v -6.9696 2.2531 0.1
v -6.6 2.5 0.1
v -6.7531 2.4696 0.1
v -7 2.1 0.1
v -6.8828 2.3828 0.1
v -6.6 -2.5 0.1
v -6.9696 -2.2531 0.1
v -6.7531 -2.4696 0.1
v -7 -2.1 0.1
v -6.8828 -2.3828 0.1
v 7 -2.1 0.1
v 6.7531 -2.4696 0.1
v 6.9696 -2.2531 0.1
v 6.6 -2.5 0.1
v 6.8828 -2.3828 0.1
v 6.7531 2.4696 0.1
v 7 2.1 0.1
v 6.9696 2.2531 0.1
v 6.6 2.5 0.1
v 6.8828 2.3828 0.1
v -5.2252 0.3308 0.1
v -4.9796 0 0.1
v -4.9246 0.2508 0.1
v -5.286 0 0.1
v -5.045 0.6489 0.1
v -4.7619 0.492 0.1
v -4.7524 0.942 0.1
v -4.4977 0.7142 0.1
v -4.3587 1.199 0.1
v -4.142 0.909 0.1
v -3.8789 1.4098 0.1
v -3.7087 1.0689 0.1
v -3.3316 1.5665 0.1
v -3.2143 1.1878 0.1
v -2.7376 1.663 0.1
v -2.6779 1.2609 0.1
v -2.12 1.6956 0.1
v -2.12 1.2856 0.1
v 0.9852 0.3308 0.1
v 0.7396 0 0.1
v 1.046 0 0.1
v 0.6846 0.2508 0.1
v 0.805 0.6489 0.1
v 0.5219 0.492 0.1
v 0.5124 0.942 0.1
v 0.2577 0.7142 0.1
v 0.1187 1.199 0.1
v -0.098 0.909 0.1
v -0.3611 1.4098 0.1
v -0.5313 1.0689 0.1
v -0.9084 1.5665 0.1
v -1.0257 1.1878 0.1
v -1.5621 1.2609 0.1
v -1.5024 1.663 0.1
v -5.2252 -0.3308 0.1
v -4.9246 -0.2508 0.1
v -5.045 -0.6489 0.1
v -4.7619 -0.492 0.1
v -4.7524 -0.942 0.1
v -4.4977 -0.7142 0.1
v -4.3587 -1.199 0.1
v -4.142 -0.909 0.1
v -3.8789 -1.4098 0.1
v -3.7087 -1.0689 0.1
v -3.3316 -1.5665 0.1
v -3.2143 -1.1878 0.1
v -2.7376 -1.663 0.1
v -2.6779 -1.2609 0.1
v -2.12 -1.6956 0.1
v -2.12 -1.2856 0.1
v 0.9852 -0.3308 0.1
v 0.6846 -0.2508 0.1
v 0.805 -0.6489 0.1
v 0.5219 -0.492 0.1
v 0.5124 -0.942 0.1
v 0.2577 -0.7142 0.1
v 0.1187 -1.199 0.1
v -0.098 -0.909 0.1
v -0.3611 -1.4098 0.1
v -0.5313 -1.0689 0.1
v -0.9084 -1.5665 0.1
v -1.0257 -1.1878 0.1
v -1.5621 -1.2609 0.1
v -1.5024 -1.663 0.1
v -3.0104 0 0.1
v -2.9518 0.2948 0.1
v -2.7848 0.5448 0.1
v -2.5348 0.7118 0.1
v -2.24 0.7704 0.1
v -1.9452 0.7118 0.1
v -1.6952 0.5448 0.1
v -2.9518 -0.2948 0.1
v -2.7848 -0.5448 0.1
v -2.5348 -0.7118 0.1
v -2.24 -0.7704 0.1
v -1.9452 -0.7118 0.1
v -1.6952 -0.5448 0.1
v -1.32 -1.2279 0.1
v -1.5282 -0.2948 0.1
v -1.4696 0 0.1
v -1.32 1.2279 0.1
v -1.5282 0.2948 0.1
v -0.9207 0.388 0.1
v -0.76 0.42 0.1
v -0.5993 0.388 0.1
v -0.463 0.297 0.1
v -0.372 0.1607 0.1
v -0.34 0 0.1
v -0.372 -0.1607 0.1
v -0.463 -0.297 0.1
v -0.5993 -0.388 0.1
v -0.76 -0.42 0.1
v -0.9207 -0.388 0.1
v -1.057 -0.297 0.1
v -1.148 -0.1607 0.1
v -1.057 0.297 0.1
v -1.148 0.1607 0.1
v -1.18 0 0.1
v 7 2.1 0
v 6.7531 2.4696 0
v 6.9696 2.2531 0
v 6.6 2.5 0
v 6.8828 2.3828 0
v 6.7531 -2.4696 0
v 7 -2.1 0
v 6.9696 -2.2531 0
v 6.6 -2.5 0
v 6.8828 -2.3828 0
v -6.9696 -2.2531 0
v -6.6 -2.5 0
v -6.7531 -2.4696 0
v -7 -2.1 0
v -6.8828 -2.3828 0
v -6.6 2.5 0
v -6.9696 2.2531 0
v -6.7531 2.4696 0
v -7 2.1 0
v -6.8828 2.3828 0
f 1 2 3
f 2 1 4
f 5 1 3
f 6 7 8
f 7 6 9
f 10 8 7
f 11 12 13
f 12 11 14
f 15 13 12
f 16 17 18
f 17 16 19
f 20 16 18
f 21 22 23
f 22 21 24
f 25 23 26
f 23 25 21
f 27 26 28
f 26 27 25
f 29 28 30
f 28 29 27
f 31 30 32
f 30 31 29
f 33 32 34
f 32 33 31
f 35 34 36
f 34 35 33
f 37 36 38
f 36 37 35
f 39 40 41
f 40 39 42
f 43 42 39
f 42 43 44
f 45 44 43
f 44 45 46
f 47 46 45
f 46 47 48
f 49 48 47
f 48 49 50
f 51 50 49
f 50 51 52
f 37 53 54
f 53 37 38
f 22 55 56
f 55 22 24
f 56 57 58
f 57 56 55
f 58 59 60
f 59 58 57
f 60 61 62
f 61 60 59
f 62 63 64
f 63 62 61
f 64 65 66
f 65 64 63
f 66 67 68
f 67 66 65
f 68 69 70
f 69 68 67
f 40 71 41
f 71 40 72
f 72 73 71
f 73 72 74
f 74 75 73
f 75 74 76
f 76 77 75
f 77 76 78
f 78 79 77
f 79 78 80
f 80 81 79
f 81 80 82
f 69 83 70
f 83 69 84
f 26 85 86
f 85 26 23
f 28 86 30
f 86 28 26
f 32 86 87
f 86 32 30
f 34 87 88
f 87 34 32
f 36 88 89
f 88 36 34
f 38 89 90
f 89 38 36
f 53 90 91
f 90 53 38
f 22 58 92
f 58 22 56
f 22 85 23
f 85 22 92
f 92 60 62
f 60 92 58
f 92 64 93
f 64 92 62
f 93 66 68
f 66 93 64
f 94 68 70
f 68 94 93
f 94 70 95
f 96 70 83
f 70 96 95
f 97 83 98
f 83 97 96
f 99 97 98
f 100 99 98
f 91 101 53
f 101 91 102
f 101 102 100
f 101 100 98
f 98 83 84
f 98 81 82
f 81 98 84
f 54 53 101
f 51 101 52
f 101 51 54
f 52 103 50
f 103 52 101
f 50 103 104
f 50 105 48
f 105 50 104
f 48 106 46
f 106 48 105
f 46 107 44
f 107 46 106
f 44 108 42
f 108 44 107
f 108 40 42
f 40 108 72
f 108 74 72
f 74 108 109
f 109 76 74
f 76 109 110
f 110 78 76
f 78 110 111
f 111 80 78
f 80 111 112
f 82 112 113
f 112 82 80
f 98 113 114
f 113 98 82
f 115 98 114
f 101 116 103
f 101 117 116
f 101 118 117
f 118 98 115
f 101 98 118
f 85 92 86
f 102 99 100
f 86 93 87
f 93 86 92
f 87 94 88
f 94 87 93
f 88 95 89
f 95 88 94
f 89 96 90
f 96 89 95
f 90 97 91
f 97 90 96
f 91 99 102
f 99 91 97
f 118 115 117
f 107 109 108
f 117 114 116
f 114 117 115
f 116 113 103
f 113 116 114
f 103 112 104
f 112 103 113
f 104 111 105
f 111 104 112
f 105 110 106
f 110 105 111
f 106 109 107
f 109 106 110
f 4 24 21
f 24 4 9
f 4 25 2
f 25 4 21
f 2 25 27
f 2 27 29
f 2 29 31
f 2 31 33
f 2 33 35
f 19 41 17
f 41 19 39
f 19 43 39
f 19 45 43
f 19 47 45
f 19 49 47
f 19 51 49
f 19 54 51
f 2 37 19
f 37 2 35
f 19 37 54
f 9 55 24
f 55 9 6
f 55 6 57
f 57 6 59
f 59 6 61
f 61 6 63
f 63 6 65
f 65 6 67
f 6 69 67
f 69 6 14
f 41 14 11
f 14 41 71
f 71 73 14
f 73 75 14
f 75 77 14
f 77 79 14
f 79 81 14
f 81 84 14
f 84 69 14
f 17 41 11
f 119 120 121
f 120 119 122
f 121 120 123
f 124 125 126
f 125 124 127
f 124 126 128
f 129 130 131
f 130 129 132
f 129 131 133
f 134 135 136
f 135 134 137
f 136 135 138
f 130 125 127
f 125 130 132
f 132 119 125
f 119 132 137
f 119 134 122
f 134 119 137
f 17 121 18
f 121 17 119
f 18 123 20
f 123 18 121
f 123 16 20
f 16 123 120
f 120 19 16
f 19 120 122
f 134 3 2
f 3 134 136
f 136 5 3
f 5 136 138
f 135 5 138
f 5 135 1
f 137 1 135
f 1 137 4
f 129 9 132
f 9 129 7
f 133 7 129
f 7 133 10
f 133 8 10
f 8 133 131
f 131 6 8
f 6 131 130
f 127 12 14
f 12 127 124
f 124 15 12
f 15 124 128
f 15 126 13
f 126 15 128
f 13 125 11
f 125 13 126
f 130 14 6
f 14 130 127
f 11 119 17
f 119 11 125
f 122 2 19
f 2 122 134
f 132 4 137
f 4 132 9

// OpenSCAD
// file: ../p/1-4cyli.scad
use <../lib.scad>
function ldraw_lib__1_4cyli() = [
// 0 Cylinder 0.25
// 0 Name: 1-4cyli.dat
// 0 Author: James Jessiman
// 0 !LDRAW_ORG Primitive UPDATE 2012-01
// 0 !LICENSE Licensed under CC BY 4.0 : see CAreadme.txt
// 
// 0 BFC CERTIFY CCW
  [0,"BFC","CERTIFY"],
  [0,"BFC","CCW"],
// 
// 0 !HISTORY 2002-03-23 [sbliss] Added BFC statement.
// 0 !HISTORY 2002-04-25 [PTadmin] Official Update 2002-02
// 0 !HISTORY 2007-06-22 [PTadmin] Header formatted for Contributor Agreement
// 0 !HISTORY 2008-07-01 [PTadmin] Official Update 2008-01
// 0 !HISTORY 2012-02-16 [Philo] Changed to CCW
// 0 !HISTORY 2012-03-30 [PTadmin] Official Update 2012-01
// 
// 
// 4 16 1 1 0 0.9239 1 0.3827 0.9239 0 0.3827 1 0 0
  [4,16,1,1,0,0.9239,1,0.3827,0.9239,0,0.3827,1,0,0],
// 5 24 1 0 0 1 1 0 0.9239 0 0.3827 1 0 -1
  [5,24,1,0,0,1,1,0,0.9239,0,0.3827,1,0,-1],
// 4 16 0.9239 1 0.3827 0.7071 1 0.7071 0.7071 0 0.7071 0.9239 0 0.3827
  [4,16,0.9239,1,0.3827,0.7071,1,0.7071,0.7071,0,0.7071,0.9239,0,0.3827],
// 5 24 0.9239 0 0.3827 0.9239 1 0.3827 0.7071 0 0.7071 1 0 0
  [5,24,0.9239,0,0.3827,0.9239,1,0.3827,0.7071,0,0.7071,1,0,0],
// 4 16 0.7071 1 0.7071 0.3827 1 0.9239 0.3827 0 0.9239 0.7071 0 0.7071
  [4,16,0.7071,1,0.7071,0.3827,1,0.9239,0.3827,0,0.9239,0.7071,0,0.7071],
// 5 24 0.7071 0 0.7071 0.7071 1 0.7071 0.3827 0 0.9239 0.9239 0 0.3827
  [5,24,0.7071,0,0.7071,0.7071,1,0.7071,0.3827,0,0.9239,0.9239,0,0.3827],
// 4 16 0.3827 1 0.9239 0 1 1 0 0 1 0.3827 0 0.9239
  [4,16,0.3827,1,0.9239,0,1,1,0,0,1,0.3827,0,0.9239],
// 5 24 0.3827 0 0.9239 0.3827 1 0.9239 0 0 1 0.7071 0 0.7071
  [5,24,0.3827,0,0.9239,0.3827,1,0.9239,0,0,1,0.7071,0,0.7071],
// 5 24 0 0 1 0 1 1 0.3827 0 0.9239 -1 0 1
  [5,24,0,0,1,0,1,1,0.3827,0,0.9239,-1,0,1],
];
module ldraw_lib__1_4cyli(step=0, col=false, unit=2/5, alt=false, line=0.2, solid=!$preview)
    makepoly(ldraw_lib__1_4cyli(), step=step, col=col, unit=unit, alt=alt, line=line, solid=solid);
ldraw_lib__1_4cyli(line=0.2);
// file: ../p/1-4chrd.scad
use <../lib.scad>
function ldraw_lib__1_4chrd() = [
// 0 Chord 0.25
// 0 Name: 1-4chrd.dat
// 0 Author: Max Martin Richter [MMR1988]
// 0 !LDRAW_ORG Primitive UPDATE 2023-05
// 0 !LICENSE Licensed under CC BY 4.0 : see CAreadme.txt
// 
// 0 BFC CERTIFY CCW
  [0,"BFC","CERTIFY"],
  [0,"BFC","CCW"],
// 
// 0 !HISTORY 2004-04-22 [PTadmin] Official Update 2004-02
// 0 !HISTORY 2007-10-09 [PTadmin] Header formatted for Contributor Agreement
// 0 !HISTORY 2008-07-01 [PTadmin] Official Update 2008-01
// 0 !HISTORY 2012-08-02 [MMR1988] Re-creation with PrimGen2 and Rectifier
// 0 !HISTORY 2012-08-09 [PTadmin] Official Update 2012-02
// 0 !HISTORY 2023-10-27 [OrionP] Change author to MMR1988 from hafhead
// 0 !HISTORY 2023-10-31 [OrionP] Official Update 2023-05
// 
// 4 16 0.9239 0 0.3827 0.3827 0 0.9239 0 0 1 1 0 0
  [4,16,0.9239,0,0.3827,0.3827,0,0.9239,0,0,1,1,0,0],
// 3 16 0.7071 0 0.7071 0.3827 0 0.9239 0.9239 0 0.3827
  [3,16,0.7071,0,0.7071,0.3827,0,0.9239,0.9239,0,0.3827],
];
module ldraw_lib__1_4chrd(step=0, col=false, unit=2/5, alt=false, line=0.2, solid=!$preview)
    makepoly(ldraw_lib__1_4chrd(), step=step, col=col, unit=unit, alt=alt, line=line, solid=solid);
ldraw_lib__1_4chrd(line=0.2);
// main file
use <../lib.scad>
use <../p/1-4chrd.scad>
use <../p/1-4cyli.scad>
function ldraw_lib__6178096g() = [
// 0 Sticker  0.6 x  1.7 with Tail Light
// 0 Name: 6178096g.dat
// 0 Author: Evert-Jan Boer [ejboer]
// 0 !LDRAW_ORG Part UPDATE 2024-02
// 0 !LICENSE Licensed under CC BY 4.0 : see CAreadme.txt
// 
// 0 BFC CERTIFY CCW
  [0,"BFC","CERTIFY"],
  [0,"BFC","CCW"],
// 
// 0 !KEYWORDS Mini VW Beetle, Set 40252, Volkswagen
// 
// 0 !HISTORY 2024-03-24 [OrionP] Official Update 2024-02
// 
// 1 16 -16.5 -.25 5.25 0 0 -1 0 1 0 1 0 0 1-4chrd.dat
  [1,16,-16.5,-.25,5.25,0,0,-1,0,1,0,1,0,0, ldraw_lib__1_4chrd()],
// 1 16 -16.5 -.25 -5.25 -1 0 0 0 1 0 0 0 -1 1-4chrd.dat
  [1,16,-16.5,-.25,-5.25,-1,0,0,0,1,0,0,0,-1, ldraw_lib__1_4chrd()],
// 1 16 16.5 -.25 -5.25 0 0 1 0 1 0 -1 0 0 1-4chrd.dat
  [1,16,16.5,-.25,-5.25,0,0,1,0,1,0,-1,0,0, ldraw_lib__1_4chrd()],
// 1 16 16.5 -.25 5.25 1 0 0 0 1 0 0 0 1 1-4chrd.dat
  [1,16,16.5,-.25,5.25,1,0,0,0,1,0,0,0,1, ldraw_lib__1_4chrd()],
// 4 0 -13.215 -.25 0 -12.449 -.25 0 -12.3116 -.25 .627 -13.0629 -.25 .827
  [4,0,-13.215,-.25,0,-12.449,-.25,0,-12.3116,-.25,.627,-13.0629,-.25,.827],
// 4 0 -13.0629 -.25 .827 -12.3116 -.25 .627 -11.9048 -.25 1.2299 -12.6125 -.25 1.6222
  [4,0,-13.0629,-.25,.827,-12.3116,-.25,.627,-11.9048,-.25,1.2299,-12.6125,-.25,1.6222],
// 4 0 -12.6125 -.25 1.6222 -11.9048 -.25 1.2299 -11.2442 -.25 1.7856 -11.8811 -.25 2.3551
  [4,0,-12.6125,-.25,1.6222,-11.9048,-.25,1.2299,-11.2442,-.25,1.7856,-11.8811,-.25,2.3551],
// 4 0 -11.8811 -.25 2.3551 -11.2442 -.25 1.7856 -10.3551 -.25 2.2726 -10.8968 -.25 2.9974
  [4,0,-11.8811,-.25,2.3551,-11.2442,-.25,1.7856,-10.3551,-.25,2.2726,-10.8968,-.25,2.9974],
// 4 0 -10.8968 -.25 2.9974 -10.3551 -.25 2.2726 -9.2718 -.25 2.6723 -9.6973 -.25 3.5246
  [4,0,-10.8968,-.25,2.9974,-10.3551,-.25,2.2726,-9.2718,-.25,2.6723,-9.6973,-.25,3.5246],
// 4 0 -9.6973 -.25 3.5246 -9.2718 -.25 2.6723 -8.0358 -.25 2.9694 -8.3289 -.25 3.9163
  [4,0,-9.6973,-.25,3.5246,-9.2718,-.25,2.6723,-8.0358,-.25,2.9694,-8.3289,-.25,3.9163],
// 4 0 -8.3289 -.25 3.9163 -8.0358 -.25 2.9694 -6.6947 -.25 3.1522 -6.8441 -.25 4.1576
  [4,0,-8.3289,-.25,3.9163,-8.0358,-.25,2.9694,-6.6947,-.25,3.1522,-6.8441,-.25,4.1576],
// 4 0 -6.6947 -.25 3.1522 -5.3 -.25 3.214 -5.3 -.25 4.239 -6.8441 -.25 4.1576
  [4,0,-6.6947,-.25,3.1522,-5.3,-.25,3.214,-5.3,-.25,4.239,-6.8441,-.25,4.1576],
// 4 0 2.615 -.25 0 2.4629 -.25 .827 1.7116 -.25 .627 1.849 -.25 0
  [4,0,2.615,-.25,0,2.4629,-.25,.827,1.7116,-.25,.627,1.849,-.25,0],
// 4 0 2.4629 -.25 .827 2.0125 -.25 1.6222 1.3048 -.25 1.2299 1.7116 -.25 .627
  [4,0,2.4629,-.25,.827,2.0125,-.25,1.6222,1.3048,-.25,1.2299,1.7116,-.25,.627],
// 4 0 2.0125 -.25 1.6222 1.2811 -.25 2.3551 .6442 -.25 1.7856 1.3048 -.25 1.2299
  [4,0,2.0125,-.25,1.6222,1.2811,-.25,2.3551,.6442,-.25,1.7856,1.3048,-.25,1.2299],
// 4 0 1.2811 -.25 2.3551 .2968 -.25 2.9974 -.2449 -.25 2.2726 .6442 -.25 1.7856
  [4,0,1.2811,-.25,2.3551,.2968,-.25,2.9974,-.2449,-.25,2.2726,.6442,-.25,1.7856],
// 4 0 .2968 -.25 2.9974 -.9027 -.25 3.5246 -1.3282 -.25 2.6723 -.2449 -.25 2.2726
  [4,0,.2968,-.25,2.9974,-.9027,-.25,3.5246,-1.3282,-.25,2.6723,-.2449,-.25,2.2726],
// 4 0 -.9027 -.25 3.5246 -2.2711 -.25 3.9163 -2.5642 -.25 2.9694 -1.3282 -.25 2.6723
  [4,0,-.9027,-.25,3.5246,-2.2711,-.25,3.9163,-2.5642,-.25,2.9694,-1.3282,-.25,2.6723],
// 4 0 -5.3 -.25 4.239 -5.3 -.25 3.214 -3.9053 -.25 3.1522 -3.7559 -.25 4.1576
  [4,0,-5.3,-.25,4.239,-5.3,-.25,3.214,-3.9053,-.25,3.1522,-3.7559,-.25,4.1576],
// 4 0 -13.215 -.25 0 -13.0629 -.25 -.827 -12.3116 -.25 -.627 -12.449 -.25 0
  [4,0,-13.215,-.25,0,-13.0629,-.25,-.827,-12.3116,-.25,-.627,-12.449,-.25,0],
// 4 0 -11.9048 -.25 -1.2299 -12.3116 -.25 -.627 -13.0629 -.25 -.827 -12.6125 -.25 -1.6222
  [4,0,-11.9048,-.25,-1.2299,-12.3116,-.25,-.627,-13.0629,-.25,-.827,-12.6125,-.25,-1.6222],
// 4 0 -11.2442 -.25 -1.7856 -11.9048 -.25 -1.2299 -12.6125 -.25 -1.6222 -11.8811 -.25 -2.3551
  [4,0,-11.2442,-.25,-1.7856,-11.9048,-.25,-1.2299,-12.6125,-.25,-1.6222,-11.8811,-.25,-2.3551],
// 4 0 -10.3551 -.25 -2.2726 -11.2442 -.25 -1.7856 -11.8811 -.25 -2.3551 -10.8968 -.25 -2.9974
  [4,0,-10.3551,-.25,-2.2726,-11.2442,-.25,-1.7856,-11.8811,-.25,-2.3551,-10.8968,-.25,-2.9974],
// 4 0 -9.2718 -.25 -2.6723 -10.3551 -.25 -2.2726 -10.8968 -.25 -2.9974 -9.6973 -.25 -3.5246
  [4,0,-9.2718,-.25,-2.6723,-10.3551,-.25,-2.2726,-10.8968,-.25,-2.9974,-9.6973,-.25,-3.5246],
// 4 0 -8.0358 -.25 -2.9694 -9.2718 -.25 -2.6723 -9.6973 -.25 -3.5246 -8.3289 -.25 -3.9163
  [4,0,-8.0358,-.25,-2.9694,-9.2718,-.25,-2.6723,-9.6973,-.25,-3.5246,-8.3289,-.25,-3.9163],
// 4 0 -6.6947 -.25 -3.1522 -8.0358 -.25 -2.9694 -8.3289 -.25 -3.9163 -6.8441 -.25 -4.1576
  [4,0,-6.6947,-.25,-3.1522,-8.0358,-.25,-2.9694,-8.3289,-.25,-3.9163,-6.8441,-.25,-4.1576],
// 4 0 -6.6947 -.25 -3.1522 -6.8441 -.25 -4.1576 -5.3 -.25 -4.239 -5.3 -.25 -3.214
  [4,0,-6.6947,-.25,-3.1522,-6.8441,-.25,-4.1576,-5.3,-.25,-4.239,-5.3,-.25,-3.214],
// 4 0 2.615 -.25 0 1.849 -.25 0 1.7116 -.25 -.627 2.4629 -.25 -.827
  [4,0,2.615,-.25,0,1.849,-.25,0,1.7116,-.25,-.627,2.4629,-.25,-.827],
// 4 0 1.3048 -.25 -1.2299 2.0125 -.25 -1.6222 2.4629 -.25 -.827 1.7116 -.25 -.627
  [4,0,1.3048,-.25,-1.2299,2.0125,-.25,-1.6222,2.4629,-.25,-.827,1.7116,-.25,-.627],
// 4 0 .6442 -.25 -1.7856 1.2811 -.25 -2.3551 2.0125 -.25 -1.6222 1.3048 -.25 -1.2299
  [4,0,.6442,-.25,-1.7856,1.2811,-.25,-2.3551,2.0125,-.25,-1.6222,1.3048,-.25,-1.2299],
// 4 0 -.2449 -.25 -2.2726 .2968 -.25 -2.9974 1.2811 -.25 -2.3551 .6442 -.25 -1.7856
  [4,0,-.2449,-.25,-2.2726,.2968,-.25,-2.9974,1.2811,-.25,-2.3551,.6442,-.25,-1.7856],
// 4 0 -1.3282 -.25 -2.6723 -.9027 -.25 -3.5246 .2968 -.25 -2.9974 -.2449 -.25 -2.2726
  [4,0,-1.3282,-.25,-2.6723,-.9027,-.25,-3.5246,.2968,-.25,-2.9974,-.2449,-.25,-2.2726],
// 4 0 -2.5642 -.25 -2.9694 -2.2711 -.25 -3.9163 -.9027 -.25 -3.5246 -1.3282 -.25 -2.6723
  [4,0,-2.5642,-.25,-2.9694,-2.2711,-.25,-3.9163,-.9027,-.25,-3.5246,-1.3282,-.25,-2.6723],
// 4 0 -5.3 -.25 -4.239 -3.7559 -.25 -4.1576 -3.9053 -.25 -3.1522 -5.3 -.25 -3.214
  [4,0,-5.3,-.25,-4.239,-3.7559,-.25,-4.1576,-3.9053,-.25,-3.1522,-5.3,-.25,-3.214],
// 4 4 -11.9048 -.25 1.2299 -12.3116 -.25 .627 -7.526 -.25 0 -7.3794 -.25 .7371
  [4,4,-11.9048,-.25,1.2299,-12.3116,-.25,.627,-7.526,-.25,0,-7.3794,-.25,.7371],
// 4 4 -11.9048 -.25 1.2299 -7.3794 -.25 .7371 -10.3551 -.25 2.2726 -11.2442 -.25 1.7856
  [4,4,-11.9048,-.25,1.2299,-7.3794,-.25,.7371,-10.3551,-.25,2.2726,-11.2442,-.25,1.7856],
// 4 4 -6.9619 -.25 1.3619 -9.2718 -.25 2.6723 -10.3551 -.25 2.2726 -7.3794 -.25 .7371
  [4,4,-6.9619,-.25,1.3619,-9.2718,-.25,2.6723,-10.3551,-.25,2.2726,-7.3794,-.25,.7371],
// 4 4 -6.3371 -.25 1.7794 -8.0358 -.25 2.9694 -9.2718 -.25 2.6723 -6.9619 -.25 1.3619
  [4,4,-6.3371,-.25,1.7794,-8.0358,-.25,2.9694,-9.2718,-.25,2.6723,-6.9619,-.25,1.3619],
// 4 4 -5.6 -.25 1.926 -6.6947 -.25 3.1522 -8.0358 -.25 2.9694 -6.3371 -.25 1.7794
  [4,4,-5.6,-.25,1.926,-6.6947,-.25,3.1522,-8.0358,-.25,2.9694,-6.3371,-.25,1.7794],
// 4 4 -4.863 -.25 1.7794 -5.3 -.25 3.214 -6.6947 -.25 3.1522 -5.6 -.25 1.926
  [4,4,-4.863,-.25,1.7794,-5.3,-.25,3.214,-6.6947,-.25,3.1522,-5.6,-.25,1.926],
// 4 4 -5.3 -.25 3.214 -4.863 -.25 1.7794 -4.2381 -.25 1.3619 -3.9053 -.25 3.1522
  [4,4,-5.3,-.25,3.214,-4.863,-.25,1.7794,-4.2381,-.25,1.3619,-3.9053,-.25,3.1522],
// 4 4 -11.9048 -.25 -1.2299 -7.3794 -.25 -.7371 -12.449 -.25 0 -12.3116 -.25 -.627
  [4,4,-11.9048,-.25,-1.2299,-7.3794,-.25,-.7371,-12.449,-.25,0,-12.3116,-.25,-.627],
// 4 4 -12.3116 -.25 .627 -12.449 -.25 0 -7.3794 -.25 -.7371 -7.526 -.25 0
  [4,4,-12.3116,-.25,.627,-12.449,-.25,0,-7.3794,-.25,-.7371,-7.526,-.25,0],
// 4 4 -11.9048 -.25 -1.2299 -11.2442 -.25 -1.7856 -10.3551 -.25 -2.2726 -7.3794 -.25 -.7371
  [4,4,-11.9048,-.25,-1.2299,-11.2442,-.25,-1.7856,-10.3551,-.25,-2.2726,-7.3794,-.25,-.7371],
// 4 4 -10.3551 -.25 -2.2726 -9.2718 -.25 -2.6723 -6.9619 -.25 -1.3619 -7.3794 -.25 -.7371
  [4,4,-10.3551,-.25,-2.2726,-9.2718,-.25,-2.6723,-6.9619,-.25,-1.3619,-7.3794,-.25,-.7371],
// 4 4 -9.2718 -.25 -2.6723 -8.0358 -.25 -2.9694 -6.6947 -.25 -3.1522 -6.9619 -.25 -1.3619
  [4,4,-9.2718,-.25,-2.6723,-8.0358,-.25,-2.9694,-6.6947,-.25,-3.1522,-6.9619,-.25,-1.3619],
// 4 4 -5.3 -.25 -3.214 -6.3371 -.25 -1.7794 -6.9619 -.25 -1.3619 -6.6947 -.25 -3.1522
  [4,4,-5.3,-.25,-3.214,-6.3371,-.25,-1.7794,-6.9619,-.25,-1.3619,-6.6947,-.25,-3.1522],
// 3 4 -6.3371 -.25 -1.7794 -5.3 -.25 -3.214 -5.6 -.25 -1.926
  [3,4,-6.3371,-.25,-1.7794,-5.3,-.25,-3.214,-5.6,-.25,-1.926],
// 4 4 -3.9053 -.25 -3.1522 -4.863 -.25 -1.7794 -5.6 -.25 -1.926 -5.3 -.25 -3.214
  [4,4,-3.9053,-.25,-3.1522,-4.863,-.25,-1.7794,-5.6,-.25,-1.926,-5.3,-.25,-3.214],
// 4 4 -3.3 -.25 -3.0697 -4.2381 -.25 -1.3619 -4.863 -.25 -1.7794 -3.9053 -.25 -3.1522
  [4,4,-3.3,-.25,-3.0697,-4.2381,-.25,-1.3619,-4.863,-.25,-1.7794,-3.9053,-.25,-3.1522],
// 3 4 -3.8206 -.25 -.7371 -4.2381 -.25 -1.3619 -3.3 -.25 -3.0697
  [3,4,-3.8206,-.25,-.7371,-4.2381,-.25,-1.3619,-3.3,-.25,-3.0697],
// 3 4 -3.674 -.25 0 -3.8206 -.25 -.7371 -3.3 -.25 -3.0697
  [3,4,-3.674,-.25,0,-3.8206,-.25,-.7371,-3.3,-.25,-3.0697],
// 4 4 -4.2381 -.25 1.3619 -3.8206 -.25 .7371 -3.3 -.25 3.0697 -3.9053 -.25 3.1522
  [4,4,-4.2381,-.25,1.3619,-3.8206,-.25,.7371,-3.3,-.25,3.0697,-3.9053,-.25,3.1522],
// 3 4 -3.3 -.25 3.0697 -3.8206 -.25 .7371 -3.674 -.25 0
  [3,4,-3.3,-.25,3.0697,-3.8206,-.25,.7371,-3.674,-.25,0],
// 3 4 -3.3 -.25 3.0697 -3.674 -.25 0 -3.3 -.25 -3.0697
  [3,4,-3.3,-.25,3.0697,-3.674,-.25,0,-3.3,-.25,-3.0697],
// 3 0 -3.3 -.25 -3.0697 -3.9053 -.25 -3.1522 -3.7559 -.25 -4.1576
  [3,0,-3.3,-.25,-3.0697,-3.9053,-.25,-3.1522,-3.7559,-.25,-4.1576],
// 4 0 -2.2711 -.25 -3.9163 -2.5642 -.25 -2.9694 -3.3 -.25 -3.0697 -3.7559 -.25 -4.1576
  [4,0,-2.2711,-.25,-3.9163,-2.5642,-.25,-2.9694,-3.3,-.25,-3.0697,-3.7559,-.25,-4.1576],
// 3 0 -3.7559 -.25 4.1576 -3.9053 -.25 3.1522 -3.3 -.25 3.0697
  [3,0,-3.7559,-.25,4.1576,-3.9053,-.25,3.1522,-3.3,-.25,3.0697],
// 4 0 -2.2711 -.25 3.9163 -3.7559 -.25 4.1576 -3.3 -.25 3.0697 -2.5642 -.25 2.9694
  [4,0,-2.2711,-.25,3.9163,-3.7559,-.25,4.1576,-3.3,-.25,3.0697,-2.5642,-.25,2.9694],
// 4 57 -3.3 -.25 3.0697 -2.3018 -.25 .9701 -1.3282 -.25 2.6723 -2.5642 -.25 2.9694
  [4,57,-3.3,-.25,3.0697,-2.3018,-.25,.9701,-1.3282,-.25,2.6723,-2.5642,-.25,2.9694],
// 3 57 -1.3282 -.25 2.6723 -2.3018 -.25 .9701 -1.9 -.25 1.05
  [3,57,-1.3282,-.25,2.6723,-2.3018,-.25,.9701,-1.9,-.25,1.05],
// 4 57 -1.9 -.25 1.05 -1.4982 -.25 .9701 -.2449 -.25 2.2726 -1.3282 -.25 2.6723
  [4,57,-1.9,-.25,1.05,-1.4982,-.25,.9701,-.2449,-.25,2.2726,-1.3282,-.25,2.6723],
// 4 57 -1.4982 -.25 .9701 -1.1575 -.25 .7425 .6442 -.25 1.7856 -.2449 -.25 2.2726
  [4,57,-1.4982,-.25,.9701,-1.1575,-.25,.7425,.6442,-.25,1.7856,-.2449,-.25,2.2726],
// 4 57 -1.1575 -.25 .7425 -.9299 -.25 .4018 1.3048 -.25 1.2299 .6442 -.25 1.7856
  [4,57,-1.1575,-.25,.7425,-.9299,-.25,.4018,1.3048,-.25,1.2299,.6442,-.25,1.7856],
// 4 57 -.9299 -.25 .4018 -.85 -.25 0 1.7116 -.25 .627 1.3048 -.25 1.2299
  [4,57,-.9299,-.25,.4018,-.85,-.25,0,1.7116,-.25,.627,1.3048,-.25,1.2299],
// 4 57 1.7116 -.25 -.627 1.849 -.25 0 1.7116 -.25 .627 -.85 -.25 0
  [4,57,1.7116,-.25,-.627,1.849,-.25,0,1.7116,-.25,.627,-.85,-.25,0],
// 4 57 1.7116 -.25 -.627 -.85 -.25 0 -.9299 -.25 -.4018 1.3048 -.25 -1.2299
  [4,57,1.7116,-.25,-.627,-.85,-.25,0,-.9299,-.25,-.4018,1.3048,-.25,-1.2299],
// 4 57 1.3048 -.25 -1.2299 -.9299 -.25 -.4018 -1.1575 -.25 -.7425 .6442 -.25 -1.7856
  [4,57,1.3048,-.25,-1.2299,-.9299,-.25,-.4018,-1.1575,-.25,-.7425,.6442,-.25,-1.7856],
// 4 57 .6442 -.25 -1.7856 -1.1575 -.25 -.7425 -1.4982 -.25 -.9701 -.2449 -.25 -2.2726
  [4,57,.6442,-.25,-1.7856,-1.1575,-.25,-.7425,-1.4982,-.25,-.9701,-.2449,-.25,-2.2726],
// 4 57 -.2449 -.25 -2.2726 -1.4982 -.25 -.9701 -1.9 -.25 -1.05 -1.3282 -.25 -2.6723
  [4,57,-.2449,-.25,-2.2726,-1.4982,-.25,-.9701,-1.9,-.25,-1.05,-1.3282,-.25,-2.6723],
// 4 57 -1.3282 -.25 -2.6723 -1.9 -.25 -1.05 -2.3018 -.25 -.9701 -2.5642 -.25 -2.9694
  [4,57,-1.3282,-.25,-2.6723,-1.9,-.25,-1.05,-2.3018,-.25,-.9701,-2.5642,-.25,-2.9694],
// 4 57 -2.5642 -.25 -2.9694 -2.3018 -.25 -.9701 -2.6425 -.25 -.7425 -3.3 -.25 -3.0697
  [4,57,-2.5642,-.25,-2.9694,-2.3018,-.25,-.9701,-2.6425,-.25,-.7425,-3.3,-.25,-3.0697],
// 3 57 -2.8701 -.25 -.4018 -3.3 -.25 -3.0697 -2.6425 -.25 -.7425
  [3,57,-2.8701,-.25,-.4018,-3.3,-.25,-3.0697,-2.6425,-.25,-.7425],
// 3 57 -3.3 -.25 3.0697 -2.6425 -.25 .7425 -2.3018 -.25 .9701
  [3,57,-3.3,-.25,3.0697,-2.6425,-.25,.7425,-2.3018,-.25,.9701],
// 3 57 -3.3 -.25 3.0697 -2.8701 -.25 .4018 -2.6425 -.25 .7425
  [3,57,-3.3,-.25,3.0697,-2.8701,-.25,.4018,-2.6425,-.25,.7425],
// 3 57 -3.3 -.25 3.0697 -2.95 -.25 0 -2.8701 -.25 .4018
  [3,57,-3.3,-.25,3.0697,-2.95,-.25,0,-2.8701,-.25,.4018],
// 3 57 -2.95 -.25 0 -3.3 -.25 -3.0697 -2.8701 -.25 -.4018
  [3,57,-2.95,-.25,0,-3.3,-.25,-3.0697,-2.8701,-.25,-.4018],
// 3 57 -3.3 -.25 3.0697 -3.3 -.25 -3.0697 -2.95 -.25 0
  [3,57,-3.3,-.25,3.0697,-3.3,-.25,-3.0697,-2.95,-.25,0],
// 3 14 -7.526 -.25 0 -7.3794 -.25 -.7371 -7.3794 -.25 .7371
  [3,14,-7.526,-.25,0,-7.3794,-.25,-.7371,-7.3794,-.25,.7371],
// 3 14 -3.8206 -.25 .7371 -3.8206 -.25 -.7371 -3.674 -.25 0
  [3,14,-3.8206,-.25,.7371,-3.8206,-.25,-.7371,-3.674,-.25,0],
// 4 14 -7.3794 -.25 .7371 -7.3794 -.25 -.7371 -6.9619 -.25 -1.3619 -6.9619 -.25 1.3619
  [4,14,-7.3794,-.25,.7371,-7.3794,-.25,-.7371,-6.9619,-.25,-1.3619,-6.9619,-.25,1.3619],
// 4 14 -6.9619 -.25 1.3619 -6.9619 -.25 -1.3619 -6.3371 -.25 -1.7794 -6.3371 -.25 1.7794
  [4,14,-6.9619,-.25,1.3619,-6.9619,-.25,-1.3619,-6.3371,-.25,-1.7794,-6.3371,-.25,1.7794],
// 4 14 -6.3371 -.25 1.7794 -6.3371 -.25 -1.7794 -5.6 -.25 -1.926 -5.6 -.25 1.926
  [4,14,-6.3371,-.25,1.7794,-6.3371,-.25,-1.7794,-5.6,-.25,-1.926,-5.6,-.25,1.926],
// 4 14 -5.6 -.25 1.926 -5.6 -.25 -1.926 -4.863 -.25 -1.7794 -4.863 -.25 1.7794
  [4,14,-5.6,-.25,1.926,-5.6,-.25,-1.926,-4.863,-.25,-1.7794,-4.863,-.25,1.7794],
// 4 14 -4.863 -.25 1.7794 -4.863 -.25 -1.7794 -4.2381 -.25 -1.3619 -4.2381 -.25 1.3619
  [4,14,-4.863,-.25,1.7794,-4.863,-.25,-1.7794,-4.2381,-.25,-1.3619,-4.2381,-.25,1.3619],
// 4 14 -4.2381 -.25 1.3619 -4.2381 -.25 -1.3619 -3.8206 -.25 -.7371 -3.8206 -.25 .7371
  [4,14,-4.2381,-.25,1.3619,-4.2381,-.25,-1.3619,-3.8206,-.25,-.7371,-3.8206,-.25,.7371],
// 3 14 -2.95 -.25 0 -2.8701 -.25 -.4018 -2.8701 -.25 .4018
  [3,14,-2.95,-.25,0,-2.8701,-.25,-.4018,-2.8701,-.25,.4018],
// 3 14 -.9299 -.25 .4018 -.9299 -.25 -.4018 -.85 -.25 0
  [3,14,-.9299,-.25,.4018,-.9299,-.25,-.4018,-.85,-.25,0],
// 4 14 -2.8701 -.25 .4018 -2.8701 -.25 -.4018 -2.6425 -.25 -.7425 -2.6425 -.25 .7425
  [4,14,-2.8701,-.25,.4018,-2.8701,-.25,-.4018,-2.6425,-.25,-.7425,-2.6425,-.25,.7425],
// 4 14 -2.6425 -.25 .7425 -2.6425 -.25 -.7425 -2.3018 -.25 -.9701 -2.3018 -.25 .9701
  [4,14,-2.6425,-.25,.7425,-2.6425,-.25,-.7425,-2.3018,-.25,-.9701,-2.3018,-.25,.9701],
// 4 14 -2.3018 -.25 .9701 -2.3018 -.25 -.9701 -1.9 -.25 -1.05 -1.9 -.25 1.05
  [4,14,-2.3018,-.25,.9701,-2.3018,-.25,-.9701,-1.9,-.25,-1.05,-1.9,-.25,1.05],
// 4 14 -1.9 -.25 1.05 -1.9 -.25 -1.05 -1.4982 -.25 -.9701 -1.4982 -.25 .9701
  [4,14,-1.9,-.25,1.05,-1.9,-.25,-1.05,-1.4982,-.25,-.9701,-1.4982,-.25,.9701],
// 4 14 -1.4982 -.25 .9701 -1.4982 -.25 -.9701 -1.1575 -.25 -.7425 -1.1575 -.25 .7425
  [4,14,-1.4982,-.25,.9701,-1.4982,-.25,-.9701,-1.1575,-.25,-.7425,-1.1575,-.25,.7425],
// 4 14 -1.1575 -.25 .7425 -1.1575 -.25 -.7425 -.9299 -.25 -.4018 -.9299 -.25 .4018
  [4,14,-1.1575,-.25,.7425,-1.1575,-.25,-.7425,-.9299,-.25,-.4018,-.9299,-.25,.4018],
// 4 16 -17.5 -.25 -5.25 -13.215 -.25 0 -13.0629 -.25 .827 -17.5 -.25 5.25
  [4,16,-17.5,-.25,-5.25,-13.215,-.25,0,-13.0629,-.25,.827,-17.5,-.25,5.25],
// 4 16 -12.6125 -.25 1.6222 -16.5 -.25 6.25 -17.5 -.25 5.25 -13.0629 -.25 .827
  [4,16,-12.6125,-.25,1.6222,-16.5,-.25,6.25,-17.5,-.25,5.25,-13.0629,-.25,.827],
// 3 16 -16.5 -.25 6.25 -12.6125 -.25 1.6222 -11.8811 -.25 2.3551
  [3,16,-16.5,-.25,6.25,-12.6125,-.25,1.6222,-11.8811,-.25,2.3551],
// 3 16 -16.5 -.25 6.25 -11.8811 -.25 2.3551 -10.8968 -.25 2.9974
  [3,16,-16.5,-.25,6.25,-11.8811,-.25,2.3551,-10.8968,-.25,2.9974],
// 3 16 -16.5 -.25 6.25 -10.8968 -.25 2.9974 -9.6973 -.25 3.5246
  [3,16,-16.5,-.25,6.25,-10.8968,-.25,2.9974,-9.6973,-.25,3.5246],
// 3 16 -16.5 -.25 6.25 -9.6973 -.25 3.5246 -8.3289 -.25 3.9163
  [3,16,-16.5,-.25,6.25,-9.6973,-.25,3.5246,-8.3289,-.25,3.9163],
// 3 16 -16.5 -.25 6.25 -8.3289 -.25 3.9163 -6.8441 -.25 4.1576
  [3,16,-16.5,-.25,6.25,-8.3289,-.25,3.9163,-6.8441,-.25,4.1576],
// 4 16 17.5 -.25 5.25 16.5 -.25 6.25 2.4629 -.25 .827 2.615 -.25 0
  [4,16,17.5,-.25,5.25,16.5,-.25,6.25,2.4629,-.25,.827,2.615,-.25,0],
// 3 16 16.5 -.25 6.25 2.0125 -.25 1.6222 2.4629 -.25 .827
  [3,16,16.5,-.25,6.25,2.0125,-.25,1.6222,2.4629,-.25,.827],
// 3 16 16.5 -.25 6.25 1.2811 -.25 2.3551 2.0125 -.25 1.6222
  [3,16,16.5,-.25,6.25,1.2811,-.25,2.3551,2.0125,-.25,1.6222],
// 3 16 16.5 -.25 6.25 .2968 -.25 2.9974 1.2811 -.25 2.3551
  [3,16,16.5,-.25,6.25,.2968,-.25,2.9974,1.2811,-.25,2.3551],
// 3 16 16.5 -.25 6.25 -.9027 -.25 3.5246 .2968 -.25 2.9974
  [3,16,16.5,-.25,6.25,-.9027,-.25,3.5246,.2968,-.25,2.9974],
// 3 16 16.5 -.25 6.25 -2.2711 -.25 3.9163 -.9027 -.25 3.5246
  [3,16,16.5,-.25,6.25,-2.2711,-.25,3.9163,-.9027,-.25,3.5246],
// 3 16 16.5 -.25 6.25 -3.7559 -.25 4.1576 -2.2711 -.25 3.9163
  [3,16,16.5,-.25,6.25,-3.7559,-.25,4.1576,-2.2711,-.25,3.9163],
// 4 16 -6.8441 -.25 4.1576 -5.3 -.25 4.239 16.5 -.25 6.25 -16.5 -.25 6.25
  [4,16,-6.8441,-.25,4.1576,-5.3,-.25,4.239,16.5,-.25,6.25,-16.5,-.25,6.25],
// 3 16 16.5 -.25 6.25 -5.3 -.25 4.239 -3.7559 -.25 4.1576
  [3,16,16.5,-.25,6.25,-5.3,-.25,4.239,-3.7559,-.25,4.1576],
// 4 16 -13.215 -.25 0 -17.5 -.25 -5.25 -16.5 -.25 -6.25 -13.0629 -.25 -.827
  [4,16,-13.215,-.25,0,-17.5,-.25,-5.25,-16.5,-.25,-6.25,-13.0629,-.25,-.827],
// 3 16 -13.0629 -.25 -.827 -16.5 -.25 -6.25 -12.6125 -.25 -1.6222
  [3,16,-13.0629,-.25,-.827,-16.5,-.25,-6.25,-12.6125,-.25,-1.6222],
// 3 16 -12.6125 -.25 -1.6222 -16.5 -.25 -6.25 -11.8811 -.25 -2.3551
  [3,16,-12.6125,-.25,-1.6222,-16.5,-.25,-6.25,-11.8811,-.25,-2.3551],
// 3 16 -11.8811 -.25 -2.3551 -16.5 -.25 -6.25 -10.8968 -.25 -2.9974
  [3,16,-11.8811,-.25,-2.3551,-16.5,-.25,-6.25,-10.8968,-.25,-2.9974],
// 3 16 -10.8968 -.25 -2.9974 -16.5 -.25 -6.25 -9.6973 -.25 -3.5246
  [3,16,-10.8968,-.25,-2.9974,-16.5,-.25,-6.25,-9.6973,-.25,-3.5246],
// 3 16 -9.6973 -.25 -3.5246 -16.5 -.25 -6.25 -8.3289 -.25 -3.9163
  [3,16,-9.6973,-.25,-3.5246,-16.5,-.25,-6.25,-8.3289,-.25,-3.9163],
// 3 16 -8.3289 -.25 -3.9163 -16.5 -.25 -6.25 -6.8441 -.25 -4.1576
  [3,16,-8.3289,-.25,-3.9163,-16.5,-.25,-6.25,-6.8441,-.25,-4.1576],
// 4 16 16.5 -.25 -6.25 -5.3 -.25 -4.239 -6.8441 -.25 -4.1576 -16.5 -.25 -6.25
  [4,16,16.5,-.25,-6.25,-5.3,-.25,-4.239,-6.8441,-.25,-4.1576,-16.5,-.25,-6.25],
// 4 16 17.5 -.25 -5.25 2.615 -.25 0 2.4629 -.25 -.827 16.5 -.25 -6.25
  [4,16,17.5,-.25,-5.25,2.615,-.25,0,2.4629,-.25,-.827,16.5,-.25,-6.25],
// 3 16 2.4629 -.25 -.827 2.0125 -.25 -1.6222 16.5 -.25 -6.25
  [3,16,2.4629,-.25,-.827,2.0125,-.25,-1.6222,16.5,-.25,-6.25],
// 3 16 2.0125 -.25 -1.6222 1.2811 -.25 -2.3551 16.5 -.25 -6.25
  [3,16,2.0125,-.25,-1.6222,1.2811,-.25,-2.3551,16.5,-.25,-6.25],
// 3 16 1.2811 -.25 -2.3551 .2968 -.25 -2.9974 16.5 -.25 -6.25
  [3,16,1.2811,-.25,-2.3551,.2968,-.25,-2.9974,16.5,-.25,-6.25],
// 3 16 .2968 -.25 -2.9974 -.9027 -.25 -3.5246 16.5 -.25 -6.25
  [3,16,.2968,-.25,-2.9974,-.9027,-.25,-3.5246,16.5,-.25,-6.25],
// 3 16 -.9027 -.25 -3.5246 -2.2711 -.25 -3.9163 16.5 -.25 -6.25
  [3,16,-.9027,-.25,-3.5246,-2.2711,-.25,-3.9163,16.5,-.25,-6.25],
// 3 16 -2.2711 -.25 -3.9163 -3.7559 -.25 -4.1576 16.5 -.25 -6.25
  [3,16,-2.2711,-.25,-3.9163,-3.7559,-.25,-4.1576,16.5,-.25,-6.25],
// 3 16 -3.7559 -.25 -4.1576 -5.3 -.25 -4.239 16.5 -.25 -6.25
  [3,16,-3.7559,-.25,-4.1576,-5.3,-.25,-4.239,16.5,-.25,-6.25],
// 3 16 17.5 -.25 5.25 2.615 -.25 0 17.5 -.25 -5.25
  [3,16,17.5,-.25,5.25,2.615,-.25,0,17.5,-.25,-5.25],
// 
// 1 16 16.5 0 5.25 1 0 0 0 -1 0 0 0 1 1-4chrd.dat
  [1,16,16.5,0,5.25,1,0,0,0,-1,0,0,0,1, ldraw_lib__1_4chrd()],
// 1 16 16.5 0 -5.25 0 0 1 0 -1 0 -1 0 0 1-4chrd.dat
  [1,16,16.5,0,-5.25,0,0,1,0,-1,0,-1,0,0, ldraw_lib__1_4chrd()],
// 1 16 -16.5 0 -5.25 -1 0 0 0 -1 0 0 0 -1 1-4chrd.dat
  [1,16,-16.5,0,-5.25,-1,0,0,0,-1,0,0,0,-1, ldraw_lib__1_4chrd()],
// 1 16 -16.5 0 5.25 0 0 -1 0 -1 0 1 0 0 1-4chrd.dat
  [1,16,-16.5,0,5.25,0,0,-1,0,-1,0,1,0,0, ldraw_lib__1_4chrd()],
// 4 16 16.5 0 -6.25 -16.5 0 -6.25 -17.5 0 -5.25 17.5 0 -5.25
  [4,16,16.5,0,-6.25,-16.5,0,-6.25,-17.5,0,-5.25,17.5,0,-5.25],
// 4 16 17.5 0 5.25 17.5 0 -5.25 -17.5 0 -5.25 -17.5 0 5.25
  [4,16,17.5,0,5.25,17.5,0,-5.25,-17.5,0,-5.25,-17.5,0,5.25],
// 4 16 17.5 0 5.25 -17.5 0 5.25 -16.5 0 6.25 16.5 0 6.25
  [4,16,17.5,0,5.25,-17.5,0,5.25,-16.5,0,6.25,16.5,0,6.25],
// 
// 1 16 16.5 -.25 5.25 1 0 0 0 .25 0 0 0 1 1-4cyli.dat
  [1,16,16.5,-.25,5.25,1,0,0,0,.25,0,0,0,1, ldraw_lib__1_4cyli()],
// 1 16 -16.5 -.25 5.25 0 0 -1 0 .25 0 1 0 0 1-4cyli.dat
  [1,16,-16.5,-.25,5.25,0,0,-1,0,.25,0,1,0,0, ldraw_lib__1_4cyli()],
// 1 16 -16.5 -.25 -5.25 -1 0 0 0 .25 0 0 0 -1 1-4cyli.dat
  [1,16,-16.5,-.25,-5.25,-1,0,0,0,.25,0,0,0,-1, ldraw_lib__1_4cyli()],
// 1 16 16.5 -.25 -5.25 0 0 1 0 .25 0 -1 0 0 1-4cyli.dat
  [1,16,16.5,-.25,-5.25,0,0,1,0,.25,0,-1,0,0, ldraw_lib__1_4cyli()],
// 4 16 16.5 -.25 -6.25 -16.5 -.25 -6.25 -16.5 0 -6.25 16.5 0 -6.25
  [4,16,16.5,-.25,-6.25,-16.5,-.25,-6.25,-16.5,0,-6.25,16.5,0,-6.25],
// 4 16 17.5 -.25 5.25 17.5 -.25 -5.25 17.5 0 -5.25 17.5 0 5.25
  [4,16,17.5,-.25,5.25,17.5,-.25,-5.25,17.5,0,-5.25,17.5,0,5.25],
// 4 16 -16.5 -.25 6.25 16.5 -.25 6.25 16.5 0 6.25 -16.5 0 6.25
  [4,16,-16.5,-.25,6.25,16.5,-.25,6.25,16.5,0,6.25,-16.5,0,6.25],
// 4 16 -17.5 -.25 -5.25 -17.5 -.25 5.25 -17.5 0 5.25 -17.5 0 -5.25
  [4,16,-17.5,-.25,-5.25,-17.5,-.25,5.25,-17.5,0,5.25,-17.5,0,-5.25],
];
module ldraw_lib__6178096g(step=0, col=false, unit=2/5, alt=false, line=0.2, solid=!$preview)
    makepoly(ldraw_lib__6178096g(), step=step, col=col, unit=unit, alt=alt, line=line, solid=solid);
ldraw_lib__6178096g(line=0.2);
